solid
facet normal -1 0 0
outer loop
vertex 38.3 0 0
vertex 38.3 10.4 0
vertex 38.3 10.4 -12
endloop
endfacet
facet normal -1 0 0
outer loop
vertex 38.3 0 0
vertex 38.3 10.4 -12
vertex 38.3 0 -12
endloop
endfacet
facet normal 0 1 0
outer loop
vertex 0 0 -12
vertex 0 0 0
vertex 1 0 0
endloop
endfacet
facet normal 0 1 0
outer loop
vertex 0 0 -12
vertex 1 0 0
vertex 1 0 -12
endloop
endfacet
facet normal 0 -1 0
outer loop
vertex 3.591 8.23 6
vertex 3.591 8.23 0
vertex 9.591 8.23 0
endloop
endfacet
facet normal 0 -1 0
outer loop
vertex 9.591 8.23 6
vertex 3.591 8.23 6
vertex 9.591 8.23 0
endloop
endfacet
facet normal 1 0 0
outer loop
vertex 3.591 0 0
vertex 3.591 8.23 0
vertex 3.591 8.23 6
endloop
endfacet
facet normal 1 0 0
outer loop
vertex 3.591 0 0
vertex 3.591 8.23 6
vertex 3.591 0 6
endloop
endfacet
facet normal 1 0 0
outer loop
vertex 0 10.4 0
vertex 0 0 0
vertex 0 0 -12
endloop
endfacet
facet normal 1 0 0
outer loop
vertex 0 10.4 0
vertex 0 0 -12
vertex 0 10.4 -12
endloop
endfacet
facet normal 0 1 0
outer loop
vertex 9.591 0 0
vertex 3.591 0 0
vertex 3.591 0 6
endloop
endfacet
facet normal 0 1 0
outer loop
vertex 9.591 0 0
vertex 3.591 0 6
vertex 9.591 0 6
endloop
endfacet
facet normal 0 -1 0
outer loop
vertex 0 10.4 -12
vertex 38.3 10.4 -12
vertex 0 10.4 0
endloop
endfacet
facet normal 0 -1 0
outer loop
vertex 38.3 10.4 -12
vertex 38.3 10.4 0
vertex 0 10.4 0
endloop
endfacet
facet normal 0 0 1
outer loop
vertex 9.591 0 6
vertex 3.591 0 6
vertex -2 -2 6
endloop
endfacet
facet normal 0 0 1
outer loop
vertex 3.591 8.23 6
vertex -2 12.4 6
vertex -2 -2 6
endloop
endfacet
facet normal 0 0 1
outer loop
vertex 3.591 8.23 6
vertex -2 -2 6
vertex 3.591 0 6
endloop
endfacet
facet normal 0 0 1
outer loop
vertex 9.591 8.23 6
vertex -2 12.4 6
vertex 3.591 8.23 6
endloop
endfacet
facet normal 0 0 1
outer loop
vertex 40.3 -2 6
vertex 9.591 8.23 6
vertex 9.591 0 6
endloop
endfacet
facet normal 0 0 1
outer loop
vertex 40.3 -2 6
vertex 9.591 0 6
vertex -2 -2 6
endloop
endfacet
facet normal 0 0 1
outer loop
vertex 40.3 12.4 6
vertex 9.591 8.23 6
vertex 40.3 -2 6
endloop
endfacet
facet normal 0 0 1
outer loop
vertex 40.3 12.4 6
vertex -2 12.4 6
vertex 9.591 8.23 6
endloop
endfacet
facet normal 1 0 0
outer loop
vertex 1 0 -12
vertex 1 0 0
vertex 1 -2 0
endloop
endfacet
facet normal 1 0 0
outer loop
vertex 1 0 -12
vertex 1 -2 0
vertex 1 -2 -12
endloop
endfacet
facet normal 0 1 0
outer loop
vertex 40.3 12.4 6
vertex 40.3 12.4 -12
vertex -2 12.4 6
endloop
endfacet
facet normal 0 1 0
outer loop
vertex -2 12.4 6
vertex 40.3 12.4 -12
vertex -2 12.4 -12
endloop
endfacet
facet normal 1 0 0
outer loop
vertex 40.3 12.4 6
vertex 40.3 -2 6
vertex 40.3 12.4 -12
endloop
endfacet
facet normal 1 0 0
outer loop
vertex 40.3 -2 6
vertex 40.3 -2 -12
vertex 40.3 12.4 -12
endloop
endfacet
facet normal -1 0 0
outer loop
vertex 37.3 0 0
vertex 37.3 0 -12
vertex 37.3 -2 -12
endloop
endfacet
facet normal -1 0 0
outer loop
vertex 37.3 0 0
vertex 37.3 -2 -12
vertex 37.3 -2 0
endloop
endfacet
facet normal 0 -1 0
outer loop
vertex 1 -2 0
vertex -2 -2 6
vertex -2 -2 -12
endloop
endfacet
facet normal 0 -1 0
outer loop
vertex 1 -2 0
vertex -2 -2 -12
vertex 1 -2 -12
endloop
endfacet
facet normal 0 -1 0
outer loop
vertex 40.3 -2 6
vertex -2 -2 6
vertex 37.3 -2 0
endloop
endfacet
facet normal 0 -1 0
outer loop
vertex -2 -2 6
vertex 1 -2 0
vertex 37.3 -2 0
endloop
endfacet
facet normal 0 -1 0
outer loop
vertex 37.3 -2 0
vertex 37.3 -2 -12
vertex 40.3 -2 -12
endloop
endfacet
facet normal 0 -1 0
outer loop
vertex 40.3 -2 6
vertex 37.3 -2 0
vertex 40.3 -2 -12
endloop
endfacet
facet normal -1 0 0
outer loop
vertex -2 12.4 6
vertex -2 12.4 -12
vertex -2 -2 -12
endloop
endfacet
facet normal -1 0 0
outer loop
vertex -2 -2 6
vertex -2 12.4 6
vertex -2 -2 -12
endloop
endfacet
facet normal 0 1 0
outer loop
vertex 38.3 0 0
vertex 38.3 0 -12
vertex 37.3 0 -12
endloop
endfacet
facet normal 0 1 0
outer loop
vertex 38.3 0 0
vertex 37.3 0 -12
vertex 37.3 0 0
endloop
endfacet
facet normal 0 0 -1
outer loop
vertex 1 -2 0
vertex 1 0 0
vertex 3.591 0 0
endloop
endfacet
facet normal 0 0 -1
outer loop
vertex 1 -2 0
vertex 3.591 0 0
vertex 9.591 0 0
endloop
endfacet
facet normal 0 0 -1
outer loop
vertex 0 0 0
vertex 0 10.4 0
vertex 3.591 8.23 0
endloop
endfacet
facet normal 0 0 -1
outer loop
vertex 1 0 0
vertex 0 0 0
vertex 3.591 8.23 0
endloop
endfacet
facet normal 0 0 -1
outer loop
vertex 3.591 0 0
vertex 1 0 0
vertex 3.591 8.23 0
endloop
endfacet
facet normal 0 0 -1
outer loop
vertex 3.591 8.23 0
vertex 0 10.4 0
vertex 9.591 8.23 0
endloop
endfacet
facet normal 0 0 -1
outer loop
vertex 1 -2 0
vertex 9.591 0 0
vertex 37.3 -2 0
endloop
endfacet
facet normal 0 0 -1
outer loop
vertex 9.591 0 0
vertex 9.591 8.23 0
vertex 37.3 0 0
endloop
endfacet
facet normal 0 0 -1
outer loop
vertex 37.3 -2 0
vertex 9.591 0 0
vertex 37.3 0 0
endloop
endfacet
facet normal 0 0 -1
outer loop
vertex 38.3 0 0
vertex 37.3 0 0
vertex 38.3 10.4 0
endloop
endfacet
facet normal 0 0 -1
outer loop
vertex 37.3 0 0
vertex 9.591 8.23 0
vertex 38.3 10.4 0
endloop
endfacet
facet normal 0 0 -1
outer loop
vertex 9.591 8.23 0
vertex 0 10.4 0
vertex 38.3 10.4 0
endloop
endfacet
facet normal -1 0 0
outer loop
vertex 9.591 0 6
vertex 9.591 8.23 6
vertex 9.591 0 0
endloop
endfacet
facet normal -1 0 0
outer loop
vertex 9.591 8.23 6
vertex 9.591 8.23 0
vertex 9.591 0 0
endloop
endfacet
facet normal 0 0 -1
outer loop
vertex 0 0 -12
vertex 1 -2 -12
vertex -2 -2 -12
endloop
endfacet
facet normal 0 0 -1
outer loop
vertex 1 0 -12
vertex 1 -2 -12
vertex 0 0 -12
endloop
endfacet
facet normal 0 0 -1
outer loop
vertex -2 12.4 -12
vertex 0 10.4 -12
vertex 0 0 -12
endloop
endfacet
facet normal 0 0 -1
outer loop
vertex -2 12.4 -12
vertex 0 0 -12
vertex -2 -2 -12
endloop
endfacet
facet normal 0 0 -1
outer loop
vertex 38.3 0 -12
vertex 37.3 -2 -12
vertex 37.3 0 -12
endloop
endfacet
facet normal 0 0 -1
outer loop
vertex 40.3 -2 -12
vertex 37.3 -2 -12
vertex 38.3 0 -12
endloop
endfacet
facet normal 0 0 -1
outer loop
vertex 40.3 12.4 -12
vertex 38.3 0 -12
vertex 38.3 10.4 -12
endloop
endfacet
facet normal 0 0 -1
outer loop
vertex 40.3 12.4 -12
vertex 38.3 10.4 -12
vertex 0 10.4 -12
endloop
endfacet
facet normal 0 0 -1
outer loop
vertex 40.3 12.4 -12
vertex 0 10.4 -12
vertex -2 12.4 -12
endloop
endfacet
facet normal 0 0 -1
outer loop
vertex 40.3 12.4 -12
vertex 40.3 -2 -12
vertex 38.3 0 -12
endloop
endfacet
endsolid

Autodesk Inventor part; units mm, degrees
ref_plane "YZ Plane" through (0, 0, 0) normal (1, 0, 0) x (0, 1, 0)
ref_plane "XZ Plane" through (0, 0, 0) normal (0, 1, 0) x (-1, 0, 0)
sketch "Sketch1" plane through (0, 0, 0) normal (0, 0, 1) x (1, 0, 0)
  line L0 (0, 5.1) -> (0, 10.2)
  line L1 (38.3, 5.1) -> (38.3, 10.2)
  line L2 (0, 0) -> (0, 5.1)
  line L3 (38.3, 0) -> (38.3, 5.1)
  line L4 (40.3, -1) -> (40.3, 11.2)
  line L5 (40.3, -1) -> (40.3, -2)
  line L6 (40.3, -2) -> (-1, -2)
  line L7 (-1, -2) -> (-2, -2)
  line L8 (-2, -2) -> (-2, 11.2)
  line L9 (38.3, 5.1) -> (38.3, 10.4)
  line L10 (38.3, 10.4) -> (0, 10.4)
  line L11 (0, 10.4) -> (0, 5.1)
  line L12 (0, 12.4) -> (-2, 12.4)
  line L13 (-2, 12.4) -> (-2, 11.2)
  line L14 (0, 12.4) -> (40.3, 12.4)
  line L15 (40.3, 12.4) -> (40.3, 11.2)
  line L16 (38.3, 0) -> (38.3, -2)
  line L17 (0, 0) -> (0, -2)
  dimension "d108" = 5.3
extrude "Extrusion1" add sketch "Sketch1" against normal blind 12 contours L2 L17 L6 L7 L8 L13 L12 L14 L15 L4 L5 L16 L3 L1 L9 L10 L11 L0
sketch "Sketch2" plane through (0, 0, 0) normal (0, 0, 1) x (1, 0, 0)
  line L0 (3.5908, 8.23) -> (9.5908, 8.23)
  line L1 (9.5908, 8.23) -> (9.5908, 0)
  line L2 (3.5908, 0) -> (9.5908, 0)
  line L3 (3.5908, 8.23) -> (3.5908, 0)
  line L4 (40.3, 12.4) -> (-2, 12.4)
  line L5 (-2, 12.4) -> (-2, -2)
  line L6 (-2, -2) -> (15, -2)
  line L7 (15, -2) -> (40.3, -2)
  line L8 (38.3, -2) -> (40.3, -2) projected
  line L9 (40.3, -2) -> (40.3, 12.4)
  line L10 (40.3, -2) -> (40.3, 12.4) projected
  point P0 (39.3, 11.2)
  point P1 (15, 12.4)
  dimension "d4" = 6
ref_plane "Work Plane10" through (0, 5.1, -62.2) normal (0, 0, -1) x (0, 1, 0)
sketch "Sketch20" plane through (0, -2, -12) normal (1, 0, 0) x (0, 0, -1)
  line L0 (0, 14.4) -> (0, 0) projected
  line L1 (0, 2) -> (0, 0)
  line L2 (0, 0) -> (-12, 0)
  line L3 (-12, 0) -> (0, 0) projected
  line L4 (-12, 0) -> (-12, 2)
  line L5 (-12, 2) -> (0, 2)
extrude "Extrusion25" add sketch "Sketch20" along normal blind 1
sketch "Sketch21" plane through (38.3, -2, 0) normal (-1, 0, 0) x (0, 0, 1)
  line L0 (0, 2) -> (0, 0)
  line L1 (-12, 0) -> (-12, 2)
  line L2 (-12, 14.4) -> (-12, 0) projected
  line L3 (0, 2) -> (0, 0)
  line L4 (-12, 2) -> (0, 2)
  line L5 (0, 2) -> (2.5, 2) projected
  line L6 (0, 2) -> (0, 0)
  line L7 (0, 0) -> (-12, 0)
  line L8 (0, 0) -> (-12, 0) projected
extrude "Extrusion26" add sketch "Sketch21" along normal blind 1
extrude "Extrusion27" add sketch "Sketch2" along normal blind 6
properties part number "frame2"
